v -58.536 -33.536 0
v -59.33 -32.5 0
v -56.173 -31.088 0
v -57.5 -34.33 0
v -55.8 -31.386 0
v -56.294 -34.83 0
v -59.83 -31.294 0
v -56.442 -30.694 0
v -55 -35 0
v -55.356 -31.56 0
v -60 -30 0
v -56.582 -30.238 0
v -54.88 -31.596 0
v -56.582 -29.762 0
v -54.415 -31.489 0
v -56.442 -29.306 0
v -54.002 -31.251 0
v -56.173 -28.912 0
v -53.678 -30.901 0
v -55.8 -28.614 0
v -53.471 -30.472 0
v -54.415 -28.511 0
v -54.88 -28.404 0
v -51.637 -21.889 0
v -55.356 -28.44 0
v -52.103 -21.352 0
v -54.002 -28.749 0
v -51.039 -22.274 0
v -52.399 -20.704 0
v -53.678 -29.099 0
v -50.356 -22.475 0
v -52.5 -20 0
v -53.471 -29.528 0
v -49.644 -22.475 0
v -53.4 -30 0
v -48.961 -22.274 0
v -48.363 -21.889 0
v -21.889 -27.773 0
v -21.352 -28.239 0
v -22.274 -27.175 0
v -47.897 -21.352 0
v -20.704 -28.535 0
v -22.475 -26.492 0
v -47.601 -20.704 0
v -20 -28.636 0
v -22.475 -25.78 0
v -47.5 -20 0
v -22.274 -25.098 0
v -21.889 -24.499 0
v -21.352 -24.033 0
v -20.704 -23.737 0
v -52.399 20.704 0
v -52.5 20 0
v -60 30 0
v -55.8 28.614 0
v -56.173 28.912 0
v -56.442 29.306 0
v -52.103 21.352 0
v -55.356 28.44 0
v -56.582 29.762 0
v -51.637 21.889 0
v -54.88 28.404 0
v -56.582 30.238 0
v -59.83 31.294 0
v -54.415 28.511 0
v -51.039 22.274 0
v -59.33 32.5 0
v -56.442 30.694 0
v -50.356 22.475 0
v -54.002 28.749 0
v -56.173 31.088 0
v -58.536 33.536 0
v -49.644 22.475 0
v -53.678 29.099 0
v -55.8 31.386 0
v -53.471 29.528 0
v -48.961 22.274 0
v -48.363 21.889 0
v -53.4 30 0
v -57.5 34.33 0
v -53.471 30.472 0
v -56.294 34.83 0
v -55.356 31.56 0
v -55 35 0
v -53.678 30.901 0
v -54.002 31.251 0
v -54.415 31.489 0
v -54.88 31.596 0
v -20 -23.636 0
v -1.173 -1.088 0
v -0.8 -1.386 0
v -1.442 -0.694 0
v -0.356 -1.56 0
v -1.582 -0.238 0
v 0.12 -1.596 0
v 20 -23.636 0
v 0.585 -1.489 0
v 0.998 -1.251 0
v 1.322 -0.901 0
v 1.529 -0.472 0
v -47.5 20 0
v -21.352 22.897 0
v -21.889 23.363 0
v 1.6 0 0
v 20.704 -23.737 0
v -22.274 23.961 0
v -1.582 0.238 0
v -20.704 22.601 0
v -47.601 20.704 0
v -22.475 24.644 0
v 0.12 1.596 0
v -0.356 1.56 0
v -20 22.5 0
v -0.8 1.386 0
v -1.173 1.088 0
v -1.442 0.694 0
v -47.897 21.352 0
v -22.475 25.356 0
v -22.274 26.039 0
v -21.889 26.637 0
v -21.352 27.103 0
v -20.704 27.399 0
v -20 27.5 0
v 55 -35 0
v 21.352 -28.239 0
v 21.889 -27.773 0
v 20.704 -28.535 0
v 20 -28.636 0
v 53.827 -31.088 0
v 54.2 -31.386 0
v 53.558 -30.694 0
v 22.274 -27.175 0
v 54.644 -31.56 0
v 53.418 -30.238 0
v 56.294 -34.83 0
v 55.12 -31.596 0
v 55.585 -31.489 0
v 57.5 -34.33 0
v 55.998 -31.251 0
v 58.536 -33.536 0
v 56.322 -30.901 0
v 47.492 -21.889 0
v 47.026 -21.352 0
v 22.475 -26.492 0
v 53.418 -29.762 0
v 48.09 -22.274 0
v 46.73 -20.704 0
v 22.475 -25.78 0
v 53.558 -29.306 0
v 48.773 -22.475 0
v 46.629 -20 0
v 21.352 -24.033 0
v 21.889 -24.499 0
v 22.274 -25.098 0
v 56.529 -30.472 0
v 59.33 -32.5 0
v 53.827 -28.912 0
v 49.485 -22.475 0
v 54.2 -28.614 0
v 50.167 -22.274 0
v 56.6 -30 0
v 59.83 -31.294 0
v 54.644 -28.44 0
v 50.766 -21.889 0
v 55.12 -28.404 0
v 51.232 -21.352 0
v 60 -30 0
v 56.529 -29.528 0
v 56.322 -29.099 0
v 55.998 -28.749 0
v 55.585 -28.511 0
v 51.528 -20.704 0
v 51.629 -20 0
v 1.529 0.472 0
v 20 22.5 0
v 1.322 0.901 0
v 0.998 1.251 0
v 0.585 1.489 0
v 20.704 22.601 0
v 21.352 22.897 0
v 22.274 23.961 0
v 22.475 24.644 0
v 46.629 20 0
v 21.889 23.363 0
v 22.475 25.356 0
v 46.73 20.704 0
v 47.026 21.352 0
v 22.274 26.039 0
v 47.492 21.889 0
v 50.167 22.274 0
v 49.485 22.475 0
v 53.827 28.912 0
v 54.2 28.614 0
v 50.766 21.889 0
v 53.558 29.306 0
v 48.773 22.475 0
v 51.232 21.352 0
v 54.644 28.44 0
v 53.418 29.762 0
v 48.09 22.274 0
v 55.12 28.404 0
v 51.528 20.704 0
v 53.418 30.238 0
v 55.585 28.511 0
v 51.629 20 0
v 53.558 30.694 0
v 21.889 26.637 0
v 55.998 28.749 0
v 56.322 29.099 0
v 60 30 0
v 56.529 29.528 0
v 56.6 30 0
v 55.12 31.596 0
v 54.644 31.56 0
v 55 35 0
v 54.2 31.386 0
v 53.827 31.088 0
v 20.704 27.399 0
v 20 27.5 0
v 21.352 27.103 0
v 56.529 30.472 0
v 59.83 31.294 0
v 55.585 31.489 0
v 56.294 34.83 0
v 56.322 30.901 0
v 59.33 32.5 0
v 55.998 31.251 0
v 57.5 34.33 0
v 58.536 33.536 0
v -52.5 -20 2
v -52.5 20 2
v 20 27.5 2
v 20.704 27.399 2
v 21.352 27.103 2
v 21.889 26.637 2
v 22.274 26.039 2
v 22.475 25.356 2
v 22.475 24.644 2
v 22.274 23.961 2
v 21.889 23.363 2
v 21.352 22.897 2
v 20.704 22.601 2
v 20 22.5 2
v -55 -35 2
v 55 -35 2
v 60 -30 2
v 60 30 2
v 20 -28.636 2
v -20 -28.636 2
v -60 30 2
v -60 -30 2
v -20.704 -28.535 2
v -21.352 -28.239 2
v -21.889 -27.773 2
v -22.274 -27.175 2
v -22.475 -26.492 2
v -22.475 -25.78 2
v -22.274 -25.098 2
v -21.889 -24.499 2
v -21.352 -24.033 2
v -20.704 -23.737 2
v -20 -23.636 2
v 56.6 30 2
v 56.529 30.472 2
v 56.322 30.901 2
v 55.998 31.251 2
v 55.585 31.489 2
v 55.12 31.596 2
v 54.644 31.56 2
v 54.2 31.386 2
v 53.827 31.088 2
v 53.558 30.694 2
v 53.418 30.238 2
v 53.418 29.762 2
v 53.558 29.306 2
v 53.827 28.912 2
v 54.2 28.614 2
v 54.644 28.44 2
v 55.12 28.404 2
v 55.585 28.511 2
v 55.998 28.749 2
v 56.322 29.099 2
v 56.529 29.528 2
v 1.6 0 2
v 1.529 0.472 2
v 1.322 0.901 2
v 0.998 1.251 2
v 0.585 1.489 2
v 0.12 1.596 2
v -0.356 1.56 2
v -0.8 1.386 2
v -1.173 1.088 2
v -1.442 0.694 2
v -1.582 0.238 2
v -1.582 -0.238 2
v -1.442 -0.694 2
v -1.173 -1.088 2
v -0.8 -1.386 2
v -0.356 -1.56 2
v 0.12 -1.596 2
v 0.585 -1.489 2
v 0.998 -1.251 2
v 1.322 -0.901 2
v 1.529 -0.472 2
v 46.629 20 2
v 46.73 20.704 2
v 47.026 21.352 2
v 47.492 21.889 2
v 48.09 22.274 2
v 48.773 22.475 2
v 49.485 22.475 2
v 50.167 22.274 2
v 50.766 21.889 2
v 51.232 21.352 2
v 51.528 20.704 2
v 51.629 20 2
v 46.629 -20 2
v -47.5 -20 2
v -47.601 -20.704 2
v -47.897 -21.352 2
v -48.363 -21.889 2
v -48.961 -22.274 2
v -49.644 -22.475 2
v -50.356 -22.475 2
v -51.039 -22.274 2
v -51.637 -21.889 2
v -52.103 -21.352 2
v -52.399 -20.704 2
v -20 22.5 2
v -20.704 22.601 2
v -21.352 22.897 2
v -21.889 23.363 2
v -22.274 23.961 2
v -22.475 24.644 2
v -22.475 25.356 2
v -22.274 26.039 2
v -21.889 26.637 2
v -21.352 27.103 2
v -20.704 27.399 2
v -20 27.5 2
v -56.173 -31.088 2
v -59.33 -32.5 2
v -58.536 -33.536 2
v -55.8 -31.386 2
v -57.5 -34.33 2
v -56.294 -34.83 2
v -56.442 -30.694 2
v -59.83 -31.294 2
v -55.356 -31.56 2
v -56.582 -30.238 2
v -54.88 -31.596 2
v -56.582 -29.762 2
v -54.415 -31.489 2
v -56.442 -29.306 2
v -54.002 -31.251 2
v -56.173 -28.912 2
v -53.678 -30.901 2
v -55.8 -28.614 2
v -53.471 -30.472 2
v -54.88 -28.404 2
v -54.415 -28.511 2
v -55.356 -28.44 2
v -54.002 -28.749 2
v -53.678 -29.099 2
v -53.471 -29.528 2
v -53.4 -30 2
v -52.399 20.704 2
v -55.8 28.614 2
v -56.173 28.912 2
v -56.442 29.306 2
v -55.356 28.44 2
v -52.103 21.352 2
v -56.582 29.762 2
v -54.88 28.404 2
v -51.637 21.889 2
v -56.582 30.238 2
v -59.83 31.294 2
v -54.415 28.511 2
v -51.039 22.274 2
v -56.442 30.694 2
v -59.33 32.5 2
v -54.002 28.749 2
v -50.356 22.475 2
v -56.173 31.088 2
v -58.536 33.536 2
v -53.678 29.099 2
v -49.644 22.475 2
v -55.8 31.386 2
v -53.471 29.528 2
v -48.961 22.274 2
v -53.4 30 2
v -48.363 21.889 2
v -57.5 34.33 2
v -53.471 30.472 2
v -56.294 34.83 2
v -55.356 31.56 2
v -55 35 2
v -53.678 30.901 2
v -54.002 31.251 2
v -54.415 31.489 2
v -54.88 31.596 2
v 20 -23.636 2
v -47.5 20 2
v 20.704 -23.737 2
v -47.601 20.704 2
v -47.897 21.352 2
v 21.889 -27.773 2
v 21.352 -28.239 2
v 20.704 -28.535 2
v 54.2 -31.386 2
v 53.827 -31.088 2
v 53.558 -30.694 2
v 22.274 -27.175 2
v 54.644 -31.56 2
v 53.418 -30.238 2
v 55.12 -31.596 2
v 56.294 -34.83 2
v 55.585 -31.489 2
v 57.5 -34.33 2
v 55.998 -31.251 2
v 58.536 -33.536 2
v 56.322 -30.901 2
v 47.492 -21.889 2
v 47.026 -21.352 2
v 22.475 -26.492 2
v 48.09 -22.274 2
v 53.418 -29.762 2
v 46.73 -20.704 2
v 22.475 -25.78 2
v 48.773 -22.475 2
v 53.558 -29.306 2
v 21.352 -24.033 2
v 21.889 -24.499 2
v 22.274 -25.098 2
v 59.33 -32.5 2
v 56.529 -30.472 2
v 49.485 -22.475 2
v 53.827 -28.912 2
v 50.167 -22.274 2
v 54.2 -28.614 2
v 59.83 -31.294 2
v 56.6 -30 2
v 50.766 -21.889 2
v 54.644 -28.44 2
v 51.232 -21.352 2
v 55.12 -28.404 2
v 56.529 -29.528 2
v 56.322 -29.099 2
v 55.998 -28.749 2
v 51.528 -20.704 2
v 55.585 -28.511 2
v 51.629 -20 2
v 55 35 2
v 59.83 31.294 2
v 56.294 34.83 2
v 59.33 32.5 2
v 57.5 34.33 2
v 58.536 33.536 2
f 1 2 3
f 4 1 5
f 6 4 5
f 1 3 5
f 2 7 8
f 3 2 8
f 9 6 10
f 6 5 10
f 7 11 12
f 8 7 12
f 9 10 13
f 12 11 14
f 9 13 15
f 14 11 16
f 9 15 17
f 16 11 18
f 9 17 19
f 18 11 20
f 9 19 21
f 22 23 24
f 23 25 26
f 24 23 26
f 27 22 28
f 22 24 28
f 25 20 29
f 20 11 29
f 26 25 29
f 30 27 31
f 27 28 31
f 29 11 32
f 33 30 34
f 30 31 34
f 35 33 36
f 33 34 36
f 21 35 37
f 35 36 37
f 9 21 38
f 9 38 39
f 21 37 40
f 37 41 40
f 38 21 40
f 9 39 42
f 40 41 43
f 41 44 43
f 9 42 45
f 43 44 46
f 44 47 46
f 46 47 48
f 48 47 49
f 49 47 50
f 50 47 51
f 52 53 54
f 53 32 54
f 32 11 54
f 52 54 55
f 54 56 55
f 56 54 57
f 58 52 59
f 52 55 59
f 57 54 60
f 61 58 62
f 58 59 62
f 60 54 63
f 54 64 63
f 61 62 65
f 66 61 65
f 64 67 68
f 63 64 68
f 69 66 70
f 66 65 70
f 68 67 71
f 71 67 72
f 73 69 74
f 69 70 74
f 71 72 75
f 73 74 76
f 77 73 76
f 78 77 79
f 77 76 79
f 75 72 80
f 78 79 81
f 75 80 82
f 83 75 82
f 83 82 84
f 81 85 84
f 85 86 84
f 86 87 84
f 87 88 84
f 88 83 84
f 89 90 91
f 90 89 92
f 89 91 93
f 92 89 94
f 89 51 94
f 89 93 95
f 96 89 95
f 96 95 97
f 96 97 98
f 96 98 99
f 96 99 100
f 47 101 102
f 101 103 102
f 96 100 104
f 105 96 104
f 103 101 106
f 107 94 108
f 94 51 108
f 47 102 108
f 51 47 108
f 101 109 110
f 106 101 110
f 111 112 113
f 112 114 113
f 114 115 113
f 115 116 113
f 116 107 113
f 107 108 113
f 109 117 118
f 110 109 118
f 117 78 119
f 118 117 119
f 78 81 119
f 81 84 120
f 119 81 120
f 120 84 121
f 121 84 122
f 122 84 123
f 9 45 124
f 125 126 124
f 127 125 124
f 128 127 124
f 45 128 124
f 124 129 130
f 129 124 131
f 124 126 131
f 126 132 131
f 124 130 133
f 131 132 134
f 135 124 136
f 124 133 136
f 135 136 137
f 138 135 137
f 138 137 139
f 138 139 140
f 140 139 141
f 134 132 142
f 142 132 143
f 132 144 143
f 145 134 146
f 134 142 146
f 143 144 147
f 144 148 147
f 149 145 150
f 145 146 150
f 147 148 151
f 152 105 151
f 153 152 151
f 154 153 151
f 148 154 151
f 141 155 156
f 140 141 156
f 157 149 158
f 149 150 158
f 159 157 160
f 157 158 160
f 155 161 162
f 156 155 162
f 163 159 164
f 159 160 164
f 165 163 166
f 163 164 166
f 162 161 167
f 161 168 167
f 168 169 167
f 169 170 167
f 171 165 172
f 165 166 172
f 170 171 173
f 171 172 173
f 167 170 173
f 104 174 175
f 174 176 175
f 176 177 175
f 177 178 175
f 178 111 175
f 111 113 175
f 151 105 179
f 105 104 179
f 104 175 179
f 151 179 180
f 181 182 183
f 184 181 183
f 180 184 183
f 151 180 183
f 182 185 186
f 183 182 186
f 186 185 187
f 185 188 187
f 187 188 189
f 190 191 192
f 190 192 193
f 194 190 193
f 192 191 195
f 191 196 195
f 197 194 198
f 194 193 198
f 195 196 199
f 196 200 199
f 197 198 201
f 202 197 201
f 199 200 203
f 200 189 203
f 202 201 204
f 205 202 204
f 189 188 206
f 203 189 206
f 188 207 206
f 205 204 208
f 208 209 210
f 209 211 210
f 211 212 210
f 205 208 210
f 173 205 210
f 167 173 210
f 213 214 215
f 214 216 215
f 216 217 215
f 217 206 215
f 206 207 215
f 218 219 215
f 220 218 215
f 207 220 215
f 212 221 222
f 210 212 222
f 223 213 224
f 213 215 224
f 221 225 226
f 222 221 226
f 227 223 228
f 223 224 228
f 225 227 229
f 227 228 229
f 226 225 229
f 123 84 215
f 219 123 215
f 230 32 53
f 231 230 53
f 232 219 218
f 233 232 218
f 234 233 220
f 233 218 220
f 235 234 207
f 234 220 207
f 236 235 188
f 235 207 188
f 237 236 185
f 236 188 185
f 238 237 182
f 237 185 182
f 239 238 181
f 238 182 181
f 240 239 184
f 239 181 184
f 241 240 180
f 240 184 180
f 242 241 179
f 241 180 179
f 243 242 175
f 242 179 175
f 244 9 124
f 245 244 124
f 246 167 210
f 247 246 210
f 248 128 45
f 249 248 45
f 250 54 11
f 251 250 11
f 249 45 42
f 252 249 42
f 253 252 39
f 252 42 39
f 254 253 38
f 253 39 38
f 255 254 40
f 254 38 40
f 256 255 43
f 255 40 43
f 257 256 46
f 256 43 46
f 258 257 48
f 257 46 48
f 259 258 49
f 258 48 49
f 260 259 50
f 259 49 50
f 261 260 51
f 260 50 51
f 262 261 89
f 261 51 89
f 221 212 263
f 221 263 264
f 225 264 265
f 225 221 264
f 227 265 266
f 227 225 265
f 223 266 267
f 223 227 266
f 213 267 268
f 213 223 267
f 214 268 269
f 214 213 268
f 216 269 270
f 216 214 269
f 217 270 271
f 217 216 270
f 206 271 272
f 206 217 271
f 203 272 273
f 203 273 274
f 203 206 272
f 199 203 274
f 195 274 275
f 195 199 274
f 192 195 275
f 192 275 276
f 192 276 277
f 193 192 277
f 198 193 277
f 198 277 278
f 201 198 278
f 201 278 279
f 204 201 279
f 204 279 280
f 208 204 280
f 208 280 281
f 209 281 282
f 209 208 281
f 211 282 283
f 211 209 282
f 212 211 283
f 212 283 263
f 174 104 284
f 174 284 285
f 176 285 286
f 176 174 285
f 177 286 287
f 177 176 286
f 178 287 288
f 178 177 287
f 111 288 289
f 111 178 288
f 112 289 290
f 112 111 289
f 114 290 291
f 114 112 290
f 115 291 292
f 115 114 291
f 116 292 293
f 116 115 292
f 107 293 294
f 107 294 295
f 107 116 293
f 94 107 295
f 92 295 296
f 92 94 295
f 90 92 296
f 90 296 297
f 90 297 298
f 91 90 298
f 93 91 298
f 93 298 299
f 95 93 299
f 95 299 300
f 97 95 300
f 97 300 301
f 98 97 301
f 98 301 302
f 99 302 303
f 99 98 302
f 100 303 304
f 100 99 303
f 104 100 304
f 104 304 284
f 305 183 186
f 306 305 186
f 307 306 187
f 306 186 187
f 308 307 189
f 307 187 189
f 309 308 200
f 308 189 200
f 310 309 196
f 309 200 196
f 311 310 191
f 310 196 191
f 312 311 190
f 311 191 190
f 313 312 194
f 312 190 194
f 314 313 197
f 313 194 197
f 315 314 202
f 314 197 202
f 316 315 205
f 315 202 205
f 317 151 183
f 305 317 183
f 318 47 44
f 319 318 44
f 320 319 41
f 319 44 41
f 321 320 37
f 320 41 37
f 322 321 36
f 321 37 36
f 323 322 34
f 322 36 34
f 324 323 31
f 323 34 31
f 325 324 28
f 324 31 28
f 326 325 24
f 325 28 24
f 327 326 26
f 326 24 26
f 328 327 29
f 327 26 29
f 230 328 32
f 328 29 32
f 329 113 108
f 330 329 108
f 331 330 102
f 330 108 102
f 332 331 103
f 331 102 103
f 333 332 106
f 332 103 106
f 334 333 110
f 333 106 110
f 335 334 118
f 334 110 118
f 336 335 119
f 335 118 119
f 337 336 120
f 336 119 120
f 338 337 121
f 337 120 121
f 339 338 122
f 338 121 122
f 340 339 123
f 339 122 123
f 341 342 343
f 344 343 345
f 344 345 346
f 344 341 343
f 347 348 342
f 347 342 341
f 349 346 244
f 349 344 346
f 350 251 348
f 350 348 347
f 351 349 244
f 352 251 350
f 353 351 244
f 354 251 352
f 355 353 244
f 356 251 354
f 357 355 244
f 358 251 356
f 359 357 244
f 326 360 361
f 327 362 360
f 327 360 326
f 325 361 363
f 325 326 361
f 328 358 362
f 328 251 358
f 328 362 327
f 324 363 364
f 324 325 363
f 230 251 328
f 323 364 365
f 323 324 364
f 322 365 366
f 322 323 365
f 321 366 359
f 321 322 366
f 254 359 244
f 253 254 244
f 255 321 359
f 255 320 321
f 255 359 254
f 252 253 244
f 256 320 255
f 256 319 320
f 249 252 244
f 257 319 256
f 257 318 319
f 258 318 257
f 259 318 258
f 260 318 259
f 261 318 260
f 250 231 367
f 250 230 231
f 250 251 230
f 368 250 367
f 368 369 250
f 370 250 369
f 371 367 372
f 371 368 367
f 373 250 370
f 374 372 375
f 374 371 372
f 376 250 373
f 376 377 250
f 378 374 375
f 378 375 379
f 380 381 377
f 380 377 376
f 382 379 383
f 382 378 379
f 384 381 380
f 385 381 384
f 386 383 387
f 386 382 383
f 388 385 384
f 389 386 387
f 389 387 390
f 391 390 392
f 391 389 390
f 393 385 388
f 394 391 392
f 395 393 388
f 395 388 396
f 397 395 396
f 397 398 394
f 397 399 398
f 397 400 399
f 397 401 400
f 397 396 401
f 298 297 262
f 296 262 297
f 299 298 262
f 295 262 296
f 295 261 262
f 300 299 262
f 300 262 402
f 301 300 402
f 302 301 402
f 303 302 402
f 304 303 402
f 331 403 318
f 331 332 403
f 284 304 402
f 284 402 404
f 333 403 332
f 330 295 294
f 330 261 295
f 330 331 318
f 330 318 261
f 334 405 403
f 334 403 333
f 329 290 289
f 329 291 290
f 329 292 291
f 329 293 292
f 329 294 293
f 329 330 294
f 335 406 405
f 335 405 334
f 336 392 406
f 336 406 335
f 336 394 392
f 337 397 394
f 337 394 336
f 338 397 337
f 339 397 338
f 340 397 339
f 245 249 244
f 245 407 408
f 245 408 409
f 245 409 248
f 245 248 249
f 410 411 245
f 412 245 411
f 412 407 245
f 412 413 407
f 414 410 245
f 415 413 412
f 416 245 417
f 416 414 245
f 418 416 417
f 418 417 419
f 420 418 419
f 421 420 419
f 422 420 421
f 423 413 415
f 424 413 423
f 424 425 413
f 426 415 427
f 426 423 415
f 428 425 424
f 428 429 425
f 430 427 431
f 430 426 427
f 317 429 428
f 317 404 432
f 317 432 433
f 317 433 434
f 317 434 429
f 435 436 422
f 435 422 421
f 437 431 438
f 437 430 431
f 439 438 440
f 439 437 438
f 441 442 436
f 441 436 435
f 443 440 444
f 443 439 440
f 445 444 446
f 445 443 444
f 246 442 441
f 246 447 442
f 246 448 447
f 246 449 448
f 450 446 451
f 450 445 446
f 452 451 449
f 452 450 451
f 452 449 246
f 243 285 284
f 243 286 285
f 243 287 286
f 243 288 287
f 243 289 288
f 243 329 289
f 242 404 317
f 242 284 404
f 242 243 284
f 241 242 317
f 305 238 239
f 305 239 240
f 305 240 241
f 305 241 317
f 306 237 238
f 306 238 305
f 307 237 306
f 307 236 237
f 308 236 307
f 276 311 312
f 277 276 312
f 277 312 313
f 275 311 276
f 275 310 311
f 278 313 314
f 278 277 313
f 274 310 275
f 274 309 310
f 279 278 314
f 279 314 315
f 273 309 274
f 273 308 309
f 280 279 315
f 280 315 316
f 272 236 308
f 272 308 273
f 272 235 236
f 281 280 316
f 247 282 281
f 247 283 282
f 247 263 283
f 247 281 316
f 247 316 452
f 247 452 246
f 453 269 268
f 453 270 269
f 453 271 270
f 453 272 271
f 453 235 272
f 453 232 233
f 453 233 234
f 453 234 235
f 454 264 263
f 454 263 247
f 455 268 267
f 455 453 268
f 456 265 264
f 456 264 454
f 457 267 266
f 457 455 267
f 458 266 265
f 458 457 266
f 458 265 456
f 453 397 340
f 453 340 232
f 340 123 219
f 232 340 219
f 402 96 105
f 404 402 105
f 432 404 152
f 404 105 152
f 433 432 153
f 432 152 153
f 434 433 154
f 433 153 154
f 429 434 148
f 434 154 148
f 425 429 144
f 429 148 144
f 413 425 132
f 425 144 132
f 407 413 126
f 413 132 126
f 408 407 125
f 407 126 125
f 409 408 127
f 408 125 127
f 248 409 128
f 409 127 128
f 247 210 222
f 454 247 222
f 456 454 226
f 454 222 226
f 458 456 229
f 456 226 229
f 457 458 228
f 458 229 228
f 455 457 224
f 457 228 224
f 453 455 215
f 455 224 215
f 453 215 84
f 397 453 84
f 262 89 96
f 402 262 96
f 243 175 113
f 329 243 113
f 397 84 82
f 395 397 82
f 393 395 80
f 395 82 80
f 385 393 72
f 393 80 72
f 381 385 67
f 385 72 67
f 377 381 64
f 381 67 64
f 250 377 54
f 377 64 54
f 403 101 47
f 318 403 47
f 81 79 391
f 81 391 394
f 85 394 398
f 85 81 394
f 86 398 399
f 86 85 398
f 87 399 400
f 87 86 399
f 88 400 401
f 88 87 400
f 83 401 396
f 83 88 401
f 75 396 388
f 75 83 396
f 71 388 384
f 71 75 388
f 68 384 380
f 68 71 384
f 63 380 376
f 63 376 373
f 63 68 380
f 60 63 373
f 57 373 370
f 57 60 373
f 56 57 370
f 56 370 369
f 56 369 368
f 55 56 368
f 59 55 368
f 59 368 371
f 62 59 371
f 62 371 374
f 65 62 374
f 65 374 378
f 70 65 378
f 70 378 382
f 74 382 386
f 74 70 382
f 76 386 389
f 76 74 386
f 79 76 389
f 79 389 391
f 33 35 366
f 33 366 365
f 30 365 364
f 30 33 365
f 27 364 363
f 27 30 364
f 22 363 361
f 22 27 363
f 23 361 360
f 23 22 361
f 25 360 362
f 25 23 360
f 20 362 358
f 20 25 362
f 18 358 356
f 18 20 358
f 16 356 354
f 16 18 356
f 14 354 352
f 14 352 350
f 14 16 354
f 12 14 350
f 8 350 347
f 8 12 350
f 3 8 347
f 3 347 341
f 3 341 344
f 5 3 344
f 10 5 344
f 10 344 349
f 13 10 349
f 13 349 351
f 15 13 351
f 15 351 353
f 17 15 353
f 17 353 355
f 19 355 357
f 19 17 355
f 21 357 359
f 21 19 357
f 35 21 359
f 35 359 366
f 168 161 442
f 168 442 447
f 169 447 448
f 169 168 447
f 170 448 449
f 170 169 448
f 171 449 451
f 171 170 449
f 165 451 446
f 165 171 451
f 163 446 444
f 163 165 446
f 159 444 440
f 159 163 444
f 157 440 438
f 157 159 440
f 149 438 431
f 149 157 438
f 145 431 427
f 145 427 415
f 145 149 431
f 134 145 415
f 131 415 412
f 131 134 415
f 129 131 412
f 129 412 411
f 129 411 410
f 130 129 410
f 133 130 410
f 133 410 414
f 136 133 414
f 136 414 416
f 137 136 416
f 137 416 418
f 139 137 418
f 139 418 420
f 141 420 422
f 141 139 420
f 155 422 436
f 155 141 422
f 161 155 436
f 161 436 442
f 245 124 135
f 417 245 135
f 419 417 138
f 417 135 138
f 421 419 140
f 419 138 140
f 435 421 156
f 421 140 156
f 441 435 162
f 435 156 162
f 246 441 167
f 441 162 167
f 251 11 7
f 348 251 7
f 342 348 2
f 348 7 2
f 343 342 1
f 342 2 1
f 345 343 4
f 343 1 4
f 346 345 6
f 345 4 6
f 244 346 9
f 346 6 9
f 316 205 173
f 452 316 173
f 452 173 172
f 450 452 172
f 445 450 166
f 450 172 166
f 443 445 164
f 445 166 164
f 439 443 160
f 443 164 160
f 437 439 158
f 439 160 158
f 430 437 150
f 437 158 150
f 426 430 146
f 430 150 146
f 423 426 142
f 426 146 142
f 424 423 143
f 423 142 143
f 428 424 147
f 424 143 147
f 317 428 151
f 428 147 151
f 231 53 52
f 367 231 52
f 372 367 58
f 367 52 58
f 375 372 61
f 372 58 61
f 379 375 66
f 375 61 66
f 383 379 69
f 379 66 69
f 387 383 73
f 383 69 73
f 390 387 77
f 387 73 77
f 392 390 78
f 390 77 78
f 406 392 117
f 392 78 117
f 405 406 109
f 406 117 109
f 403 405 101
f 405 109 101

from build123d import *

# Parameters (mm, degrees)
SKETCH1_R           = 1.6
BOSS_EXTRUDE1_DEPTH = 2


with BuildPart() as part:
    # Sketch1 → Boss-Extrude1 (new body)
    with BuildSketch(Plane.XY):
        with BuildLine():
            Line((55, 35), (-55, 35))
            ThreePointArc((-55, 35), (-58.535533906, 33.535533906), (-60, 30))
            Line((-60, 30), (-60, -30))
            ThreePointArc((-60, -30), (-58.535533906, -33.535533906), (-55, -35))
            Line((-55, -35), (55, -35))
            ThreePointArc((55, -35), (58.535533906, -33.535533906), (60, -30))
            Line((60, -30), (60, 30))
            ThreePointArc((60, 30), (58.535533906, 33.535533906), (55, 35))
        make_face()
        with Locations((-55, 30)):
            Circle(SKETCH1_R, mode=Mode.SUBTRACT)
        with Locations((-55, -30)):
            Circle(SKETCH1_R, mode=Mode.SUBTRACT)
        with Locations((55, -30)):
            Circle(SKETCH1_R, mode=Mode.SUBTRACT)
        with Locations((55, 30)):
            Circle(SKETCH1_R, mode=Mode.SUBTRACT)
        Circle(SKETCH1_R, mode=Mode.SUBTRACT)
        with BuildLine():
            Line((-20, 27.5), (20, 27.5))
            ThreePointArc((20, 27.5), (22.5, 25), (20, 22.5))
            Line((20, 22.5), (-20, 22.5))
            ThreePointArc((-20, 22.5), (-22.5, 25), (-20, 27.5))
        make_face(mode=Mode.SUBTRACT)
        with BuildLine():
            Line((-47.5, 20), (-47.5, -20))
            ThreePointArc((-47.5, -20), (-50, -22.5), (-52.5, -20))
            Line((-52.5, -20), (-52.5, 20))
            ThreePointArc((-52.5, 20), (-50, 22.5), (-47.5, 20))
        make_face(mode=Mode.SUBTRACT)
        with BuildLine():
            Line((-20, -23.636211525), (20, -23.636211525))
            ThreePointArc((20, -23.636211525), (22.5, -26.136211525), (20, -28.636211525))
            Line((20, -28.636211525), (-20, -28.636211525))
            ThreePointArc((-20, -28.636211525), (-22.5, -26.136211525), (-20, -23.636211525))
        make_face(mode=Mode.SUBTRACT)
        with BuildLine():
            Line((51.628871571, 20), (51.628871571, -20))
            ThreePointArc((51.628871571, -20), (49.128871571, -22.5), (46.628871571, -20))
            Line((46.628871571, -20), (46.628871571, 20))
            ThreePointArc((46.628871571, 20), (49.128871571, 22.5), (51.628871571, 20))
        make_face(mode=Mode.SUBTRACT)
    extrude(amount=BOSS_EXTRUDE1_DEPTH)


solid = part.part
